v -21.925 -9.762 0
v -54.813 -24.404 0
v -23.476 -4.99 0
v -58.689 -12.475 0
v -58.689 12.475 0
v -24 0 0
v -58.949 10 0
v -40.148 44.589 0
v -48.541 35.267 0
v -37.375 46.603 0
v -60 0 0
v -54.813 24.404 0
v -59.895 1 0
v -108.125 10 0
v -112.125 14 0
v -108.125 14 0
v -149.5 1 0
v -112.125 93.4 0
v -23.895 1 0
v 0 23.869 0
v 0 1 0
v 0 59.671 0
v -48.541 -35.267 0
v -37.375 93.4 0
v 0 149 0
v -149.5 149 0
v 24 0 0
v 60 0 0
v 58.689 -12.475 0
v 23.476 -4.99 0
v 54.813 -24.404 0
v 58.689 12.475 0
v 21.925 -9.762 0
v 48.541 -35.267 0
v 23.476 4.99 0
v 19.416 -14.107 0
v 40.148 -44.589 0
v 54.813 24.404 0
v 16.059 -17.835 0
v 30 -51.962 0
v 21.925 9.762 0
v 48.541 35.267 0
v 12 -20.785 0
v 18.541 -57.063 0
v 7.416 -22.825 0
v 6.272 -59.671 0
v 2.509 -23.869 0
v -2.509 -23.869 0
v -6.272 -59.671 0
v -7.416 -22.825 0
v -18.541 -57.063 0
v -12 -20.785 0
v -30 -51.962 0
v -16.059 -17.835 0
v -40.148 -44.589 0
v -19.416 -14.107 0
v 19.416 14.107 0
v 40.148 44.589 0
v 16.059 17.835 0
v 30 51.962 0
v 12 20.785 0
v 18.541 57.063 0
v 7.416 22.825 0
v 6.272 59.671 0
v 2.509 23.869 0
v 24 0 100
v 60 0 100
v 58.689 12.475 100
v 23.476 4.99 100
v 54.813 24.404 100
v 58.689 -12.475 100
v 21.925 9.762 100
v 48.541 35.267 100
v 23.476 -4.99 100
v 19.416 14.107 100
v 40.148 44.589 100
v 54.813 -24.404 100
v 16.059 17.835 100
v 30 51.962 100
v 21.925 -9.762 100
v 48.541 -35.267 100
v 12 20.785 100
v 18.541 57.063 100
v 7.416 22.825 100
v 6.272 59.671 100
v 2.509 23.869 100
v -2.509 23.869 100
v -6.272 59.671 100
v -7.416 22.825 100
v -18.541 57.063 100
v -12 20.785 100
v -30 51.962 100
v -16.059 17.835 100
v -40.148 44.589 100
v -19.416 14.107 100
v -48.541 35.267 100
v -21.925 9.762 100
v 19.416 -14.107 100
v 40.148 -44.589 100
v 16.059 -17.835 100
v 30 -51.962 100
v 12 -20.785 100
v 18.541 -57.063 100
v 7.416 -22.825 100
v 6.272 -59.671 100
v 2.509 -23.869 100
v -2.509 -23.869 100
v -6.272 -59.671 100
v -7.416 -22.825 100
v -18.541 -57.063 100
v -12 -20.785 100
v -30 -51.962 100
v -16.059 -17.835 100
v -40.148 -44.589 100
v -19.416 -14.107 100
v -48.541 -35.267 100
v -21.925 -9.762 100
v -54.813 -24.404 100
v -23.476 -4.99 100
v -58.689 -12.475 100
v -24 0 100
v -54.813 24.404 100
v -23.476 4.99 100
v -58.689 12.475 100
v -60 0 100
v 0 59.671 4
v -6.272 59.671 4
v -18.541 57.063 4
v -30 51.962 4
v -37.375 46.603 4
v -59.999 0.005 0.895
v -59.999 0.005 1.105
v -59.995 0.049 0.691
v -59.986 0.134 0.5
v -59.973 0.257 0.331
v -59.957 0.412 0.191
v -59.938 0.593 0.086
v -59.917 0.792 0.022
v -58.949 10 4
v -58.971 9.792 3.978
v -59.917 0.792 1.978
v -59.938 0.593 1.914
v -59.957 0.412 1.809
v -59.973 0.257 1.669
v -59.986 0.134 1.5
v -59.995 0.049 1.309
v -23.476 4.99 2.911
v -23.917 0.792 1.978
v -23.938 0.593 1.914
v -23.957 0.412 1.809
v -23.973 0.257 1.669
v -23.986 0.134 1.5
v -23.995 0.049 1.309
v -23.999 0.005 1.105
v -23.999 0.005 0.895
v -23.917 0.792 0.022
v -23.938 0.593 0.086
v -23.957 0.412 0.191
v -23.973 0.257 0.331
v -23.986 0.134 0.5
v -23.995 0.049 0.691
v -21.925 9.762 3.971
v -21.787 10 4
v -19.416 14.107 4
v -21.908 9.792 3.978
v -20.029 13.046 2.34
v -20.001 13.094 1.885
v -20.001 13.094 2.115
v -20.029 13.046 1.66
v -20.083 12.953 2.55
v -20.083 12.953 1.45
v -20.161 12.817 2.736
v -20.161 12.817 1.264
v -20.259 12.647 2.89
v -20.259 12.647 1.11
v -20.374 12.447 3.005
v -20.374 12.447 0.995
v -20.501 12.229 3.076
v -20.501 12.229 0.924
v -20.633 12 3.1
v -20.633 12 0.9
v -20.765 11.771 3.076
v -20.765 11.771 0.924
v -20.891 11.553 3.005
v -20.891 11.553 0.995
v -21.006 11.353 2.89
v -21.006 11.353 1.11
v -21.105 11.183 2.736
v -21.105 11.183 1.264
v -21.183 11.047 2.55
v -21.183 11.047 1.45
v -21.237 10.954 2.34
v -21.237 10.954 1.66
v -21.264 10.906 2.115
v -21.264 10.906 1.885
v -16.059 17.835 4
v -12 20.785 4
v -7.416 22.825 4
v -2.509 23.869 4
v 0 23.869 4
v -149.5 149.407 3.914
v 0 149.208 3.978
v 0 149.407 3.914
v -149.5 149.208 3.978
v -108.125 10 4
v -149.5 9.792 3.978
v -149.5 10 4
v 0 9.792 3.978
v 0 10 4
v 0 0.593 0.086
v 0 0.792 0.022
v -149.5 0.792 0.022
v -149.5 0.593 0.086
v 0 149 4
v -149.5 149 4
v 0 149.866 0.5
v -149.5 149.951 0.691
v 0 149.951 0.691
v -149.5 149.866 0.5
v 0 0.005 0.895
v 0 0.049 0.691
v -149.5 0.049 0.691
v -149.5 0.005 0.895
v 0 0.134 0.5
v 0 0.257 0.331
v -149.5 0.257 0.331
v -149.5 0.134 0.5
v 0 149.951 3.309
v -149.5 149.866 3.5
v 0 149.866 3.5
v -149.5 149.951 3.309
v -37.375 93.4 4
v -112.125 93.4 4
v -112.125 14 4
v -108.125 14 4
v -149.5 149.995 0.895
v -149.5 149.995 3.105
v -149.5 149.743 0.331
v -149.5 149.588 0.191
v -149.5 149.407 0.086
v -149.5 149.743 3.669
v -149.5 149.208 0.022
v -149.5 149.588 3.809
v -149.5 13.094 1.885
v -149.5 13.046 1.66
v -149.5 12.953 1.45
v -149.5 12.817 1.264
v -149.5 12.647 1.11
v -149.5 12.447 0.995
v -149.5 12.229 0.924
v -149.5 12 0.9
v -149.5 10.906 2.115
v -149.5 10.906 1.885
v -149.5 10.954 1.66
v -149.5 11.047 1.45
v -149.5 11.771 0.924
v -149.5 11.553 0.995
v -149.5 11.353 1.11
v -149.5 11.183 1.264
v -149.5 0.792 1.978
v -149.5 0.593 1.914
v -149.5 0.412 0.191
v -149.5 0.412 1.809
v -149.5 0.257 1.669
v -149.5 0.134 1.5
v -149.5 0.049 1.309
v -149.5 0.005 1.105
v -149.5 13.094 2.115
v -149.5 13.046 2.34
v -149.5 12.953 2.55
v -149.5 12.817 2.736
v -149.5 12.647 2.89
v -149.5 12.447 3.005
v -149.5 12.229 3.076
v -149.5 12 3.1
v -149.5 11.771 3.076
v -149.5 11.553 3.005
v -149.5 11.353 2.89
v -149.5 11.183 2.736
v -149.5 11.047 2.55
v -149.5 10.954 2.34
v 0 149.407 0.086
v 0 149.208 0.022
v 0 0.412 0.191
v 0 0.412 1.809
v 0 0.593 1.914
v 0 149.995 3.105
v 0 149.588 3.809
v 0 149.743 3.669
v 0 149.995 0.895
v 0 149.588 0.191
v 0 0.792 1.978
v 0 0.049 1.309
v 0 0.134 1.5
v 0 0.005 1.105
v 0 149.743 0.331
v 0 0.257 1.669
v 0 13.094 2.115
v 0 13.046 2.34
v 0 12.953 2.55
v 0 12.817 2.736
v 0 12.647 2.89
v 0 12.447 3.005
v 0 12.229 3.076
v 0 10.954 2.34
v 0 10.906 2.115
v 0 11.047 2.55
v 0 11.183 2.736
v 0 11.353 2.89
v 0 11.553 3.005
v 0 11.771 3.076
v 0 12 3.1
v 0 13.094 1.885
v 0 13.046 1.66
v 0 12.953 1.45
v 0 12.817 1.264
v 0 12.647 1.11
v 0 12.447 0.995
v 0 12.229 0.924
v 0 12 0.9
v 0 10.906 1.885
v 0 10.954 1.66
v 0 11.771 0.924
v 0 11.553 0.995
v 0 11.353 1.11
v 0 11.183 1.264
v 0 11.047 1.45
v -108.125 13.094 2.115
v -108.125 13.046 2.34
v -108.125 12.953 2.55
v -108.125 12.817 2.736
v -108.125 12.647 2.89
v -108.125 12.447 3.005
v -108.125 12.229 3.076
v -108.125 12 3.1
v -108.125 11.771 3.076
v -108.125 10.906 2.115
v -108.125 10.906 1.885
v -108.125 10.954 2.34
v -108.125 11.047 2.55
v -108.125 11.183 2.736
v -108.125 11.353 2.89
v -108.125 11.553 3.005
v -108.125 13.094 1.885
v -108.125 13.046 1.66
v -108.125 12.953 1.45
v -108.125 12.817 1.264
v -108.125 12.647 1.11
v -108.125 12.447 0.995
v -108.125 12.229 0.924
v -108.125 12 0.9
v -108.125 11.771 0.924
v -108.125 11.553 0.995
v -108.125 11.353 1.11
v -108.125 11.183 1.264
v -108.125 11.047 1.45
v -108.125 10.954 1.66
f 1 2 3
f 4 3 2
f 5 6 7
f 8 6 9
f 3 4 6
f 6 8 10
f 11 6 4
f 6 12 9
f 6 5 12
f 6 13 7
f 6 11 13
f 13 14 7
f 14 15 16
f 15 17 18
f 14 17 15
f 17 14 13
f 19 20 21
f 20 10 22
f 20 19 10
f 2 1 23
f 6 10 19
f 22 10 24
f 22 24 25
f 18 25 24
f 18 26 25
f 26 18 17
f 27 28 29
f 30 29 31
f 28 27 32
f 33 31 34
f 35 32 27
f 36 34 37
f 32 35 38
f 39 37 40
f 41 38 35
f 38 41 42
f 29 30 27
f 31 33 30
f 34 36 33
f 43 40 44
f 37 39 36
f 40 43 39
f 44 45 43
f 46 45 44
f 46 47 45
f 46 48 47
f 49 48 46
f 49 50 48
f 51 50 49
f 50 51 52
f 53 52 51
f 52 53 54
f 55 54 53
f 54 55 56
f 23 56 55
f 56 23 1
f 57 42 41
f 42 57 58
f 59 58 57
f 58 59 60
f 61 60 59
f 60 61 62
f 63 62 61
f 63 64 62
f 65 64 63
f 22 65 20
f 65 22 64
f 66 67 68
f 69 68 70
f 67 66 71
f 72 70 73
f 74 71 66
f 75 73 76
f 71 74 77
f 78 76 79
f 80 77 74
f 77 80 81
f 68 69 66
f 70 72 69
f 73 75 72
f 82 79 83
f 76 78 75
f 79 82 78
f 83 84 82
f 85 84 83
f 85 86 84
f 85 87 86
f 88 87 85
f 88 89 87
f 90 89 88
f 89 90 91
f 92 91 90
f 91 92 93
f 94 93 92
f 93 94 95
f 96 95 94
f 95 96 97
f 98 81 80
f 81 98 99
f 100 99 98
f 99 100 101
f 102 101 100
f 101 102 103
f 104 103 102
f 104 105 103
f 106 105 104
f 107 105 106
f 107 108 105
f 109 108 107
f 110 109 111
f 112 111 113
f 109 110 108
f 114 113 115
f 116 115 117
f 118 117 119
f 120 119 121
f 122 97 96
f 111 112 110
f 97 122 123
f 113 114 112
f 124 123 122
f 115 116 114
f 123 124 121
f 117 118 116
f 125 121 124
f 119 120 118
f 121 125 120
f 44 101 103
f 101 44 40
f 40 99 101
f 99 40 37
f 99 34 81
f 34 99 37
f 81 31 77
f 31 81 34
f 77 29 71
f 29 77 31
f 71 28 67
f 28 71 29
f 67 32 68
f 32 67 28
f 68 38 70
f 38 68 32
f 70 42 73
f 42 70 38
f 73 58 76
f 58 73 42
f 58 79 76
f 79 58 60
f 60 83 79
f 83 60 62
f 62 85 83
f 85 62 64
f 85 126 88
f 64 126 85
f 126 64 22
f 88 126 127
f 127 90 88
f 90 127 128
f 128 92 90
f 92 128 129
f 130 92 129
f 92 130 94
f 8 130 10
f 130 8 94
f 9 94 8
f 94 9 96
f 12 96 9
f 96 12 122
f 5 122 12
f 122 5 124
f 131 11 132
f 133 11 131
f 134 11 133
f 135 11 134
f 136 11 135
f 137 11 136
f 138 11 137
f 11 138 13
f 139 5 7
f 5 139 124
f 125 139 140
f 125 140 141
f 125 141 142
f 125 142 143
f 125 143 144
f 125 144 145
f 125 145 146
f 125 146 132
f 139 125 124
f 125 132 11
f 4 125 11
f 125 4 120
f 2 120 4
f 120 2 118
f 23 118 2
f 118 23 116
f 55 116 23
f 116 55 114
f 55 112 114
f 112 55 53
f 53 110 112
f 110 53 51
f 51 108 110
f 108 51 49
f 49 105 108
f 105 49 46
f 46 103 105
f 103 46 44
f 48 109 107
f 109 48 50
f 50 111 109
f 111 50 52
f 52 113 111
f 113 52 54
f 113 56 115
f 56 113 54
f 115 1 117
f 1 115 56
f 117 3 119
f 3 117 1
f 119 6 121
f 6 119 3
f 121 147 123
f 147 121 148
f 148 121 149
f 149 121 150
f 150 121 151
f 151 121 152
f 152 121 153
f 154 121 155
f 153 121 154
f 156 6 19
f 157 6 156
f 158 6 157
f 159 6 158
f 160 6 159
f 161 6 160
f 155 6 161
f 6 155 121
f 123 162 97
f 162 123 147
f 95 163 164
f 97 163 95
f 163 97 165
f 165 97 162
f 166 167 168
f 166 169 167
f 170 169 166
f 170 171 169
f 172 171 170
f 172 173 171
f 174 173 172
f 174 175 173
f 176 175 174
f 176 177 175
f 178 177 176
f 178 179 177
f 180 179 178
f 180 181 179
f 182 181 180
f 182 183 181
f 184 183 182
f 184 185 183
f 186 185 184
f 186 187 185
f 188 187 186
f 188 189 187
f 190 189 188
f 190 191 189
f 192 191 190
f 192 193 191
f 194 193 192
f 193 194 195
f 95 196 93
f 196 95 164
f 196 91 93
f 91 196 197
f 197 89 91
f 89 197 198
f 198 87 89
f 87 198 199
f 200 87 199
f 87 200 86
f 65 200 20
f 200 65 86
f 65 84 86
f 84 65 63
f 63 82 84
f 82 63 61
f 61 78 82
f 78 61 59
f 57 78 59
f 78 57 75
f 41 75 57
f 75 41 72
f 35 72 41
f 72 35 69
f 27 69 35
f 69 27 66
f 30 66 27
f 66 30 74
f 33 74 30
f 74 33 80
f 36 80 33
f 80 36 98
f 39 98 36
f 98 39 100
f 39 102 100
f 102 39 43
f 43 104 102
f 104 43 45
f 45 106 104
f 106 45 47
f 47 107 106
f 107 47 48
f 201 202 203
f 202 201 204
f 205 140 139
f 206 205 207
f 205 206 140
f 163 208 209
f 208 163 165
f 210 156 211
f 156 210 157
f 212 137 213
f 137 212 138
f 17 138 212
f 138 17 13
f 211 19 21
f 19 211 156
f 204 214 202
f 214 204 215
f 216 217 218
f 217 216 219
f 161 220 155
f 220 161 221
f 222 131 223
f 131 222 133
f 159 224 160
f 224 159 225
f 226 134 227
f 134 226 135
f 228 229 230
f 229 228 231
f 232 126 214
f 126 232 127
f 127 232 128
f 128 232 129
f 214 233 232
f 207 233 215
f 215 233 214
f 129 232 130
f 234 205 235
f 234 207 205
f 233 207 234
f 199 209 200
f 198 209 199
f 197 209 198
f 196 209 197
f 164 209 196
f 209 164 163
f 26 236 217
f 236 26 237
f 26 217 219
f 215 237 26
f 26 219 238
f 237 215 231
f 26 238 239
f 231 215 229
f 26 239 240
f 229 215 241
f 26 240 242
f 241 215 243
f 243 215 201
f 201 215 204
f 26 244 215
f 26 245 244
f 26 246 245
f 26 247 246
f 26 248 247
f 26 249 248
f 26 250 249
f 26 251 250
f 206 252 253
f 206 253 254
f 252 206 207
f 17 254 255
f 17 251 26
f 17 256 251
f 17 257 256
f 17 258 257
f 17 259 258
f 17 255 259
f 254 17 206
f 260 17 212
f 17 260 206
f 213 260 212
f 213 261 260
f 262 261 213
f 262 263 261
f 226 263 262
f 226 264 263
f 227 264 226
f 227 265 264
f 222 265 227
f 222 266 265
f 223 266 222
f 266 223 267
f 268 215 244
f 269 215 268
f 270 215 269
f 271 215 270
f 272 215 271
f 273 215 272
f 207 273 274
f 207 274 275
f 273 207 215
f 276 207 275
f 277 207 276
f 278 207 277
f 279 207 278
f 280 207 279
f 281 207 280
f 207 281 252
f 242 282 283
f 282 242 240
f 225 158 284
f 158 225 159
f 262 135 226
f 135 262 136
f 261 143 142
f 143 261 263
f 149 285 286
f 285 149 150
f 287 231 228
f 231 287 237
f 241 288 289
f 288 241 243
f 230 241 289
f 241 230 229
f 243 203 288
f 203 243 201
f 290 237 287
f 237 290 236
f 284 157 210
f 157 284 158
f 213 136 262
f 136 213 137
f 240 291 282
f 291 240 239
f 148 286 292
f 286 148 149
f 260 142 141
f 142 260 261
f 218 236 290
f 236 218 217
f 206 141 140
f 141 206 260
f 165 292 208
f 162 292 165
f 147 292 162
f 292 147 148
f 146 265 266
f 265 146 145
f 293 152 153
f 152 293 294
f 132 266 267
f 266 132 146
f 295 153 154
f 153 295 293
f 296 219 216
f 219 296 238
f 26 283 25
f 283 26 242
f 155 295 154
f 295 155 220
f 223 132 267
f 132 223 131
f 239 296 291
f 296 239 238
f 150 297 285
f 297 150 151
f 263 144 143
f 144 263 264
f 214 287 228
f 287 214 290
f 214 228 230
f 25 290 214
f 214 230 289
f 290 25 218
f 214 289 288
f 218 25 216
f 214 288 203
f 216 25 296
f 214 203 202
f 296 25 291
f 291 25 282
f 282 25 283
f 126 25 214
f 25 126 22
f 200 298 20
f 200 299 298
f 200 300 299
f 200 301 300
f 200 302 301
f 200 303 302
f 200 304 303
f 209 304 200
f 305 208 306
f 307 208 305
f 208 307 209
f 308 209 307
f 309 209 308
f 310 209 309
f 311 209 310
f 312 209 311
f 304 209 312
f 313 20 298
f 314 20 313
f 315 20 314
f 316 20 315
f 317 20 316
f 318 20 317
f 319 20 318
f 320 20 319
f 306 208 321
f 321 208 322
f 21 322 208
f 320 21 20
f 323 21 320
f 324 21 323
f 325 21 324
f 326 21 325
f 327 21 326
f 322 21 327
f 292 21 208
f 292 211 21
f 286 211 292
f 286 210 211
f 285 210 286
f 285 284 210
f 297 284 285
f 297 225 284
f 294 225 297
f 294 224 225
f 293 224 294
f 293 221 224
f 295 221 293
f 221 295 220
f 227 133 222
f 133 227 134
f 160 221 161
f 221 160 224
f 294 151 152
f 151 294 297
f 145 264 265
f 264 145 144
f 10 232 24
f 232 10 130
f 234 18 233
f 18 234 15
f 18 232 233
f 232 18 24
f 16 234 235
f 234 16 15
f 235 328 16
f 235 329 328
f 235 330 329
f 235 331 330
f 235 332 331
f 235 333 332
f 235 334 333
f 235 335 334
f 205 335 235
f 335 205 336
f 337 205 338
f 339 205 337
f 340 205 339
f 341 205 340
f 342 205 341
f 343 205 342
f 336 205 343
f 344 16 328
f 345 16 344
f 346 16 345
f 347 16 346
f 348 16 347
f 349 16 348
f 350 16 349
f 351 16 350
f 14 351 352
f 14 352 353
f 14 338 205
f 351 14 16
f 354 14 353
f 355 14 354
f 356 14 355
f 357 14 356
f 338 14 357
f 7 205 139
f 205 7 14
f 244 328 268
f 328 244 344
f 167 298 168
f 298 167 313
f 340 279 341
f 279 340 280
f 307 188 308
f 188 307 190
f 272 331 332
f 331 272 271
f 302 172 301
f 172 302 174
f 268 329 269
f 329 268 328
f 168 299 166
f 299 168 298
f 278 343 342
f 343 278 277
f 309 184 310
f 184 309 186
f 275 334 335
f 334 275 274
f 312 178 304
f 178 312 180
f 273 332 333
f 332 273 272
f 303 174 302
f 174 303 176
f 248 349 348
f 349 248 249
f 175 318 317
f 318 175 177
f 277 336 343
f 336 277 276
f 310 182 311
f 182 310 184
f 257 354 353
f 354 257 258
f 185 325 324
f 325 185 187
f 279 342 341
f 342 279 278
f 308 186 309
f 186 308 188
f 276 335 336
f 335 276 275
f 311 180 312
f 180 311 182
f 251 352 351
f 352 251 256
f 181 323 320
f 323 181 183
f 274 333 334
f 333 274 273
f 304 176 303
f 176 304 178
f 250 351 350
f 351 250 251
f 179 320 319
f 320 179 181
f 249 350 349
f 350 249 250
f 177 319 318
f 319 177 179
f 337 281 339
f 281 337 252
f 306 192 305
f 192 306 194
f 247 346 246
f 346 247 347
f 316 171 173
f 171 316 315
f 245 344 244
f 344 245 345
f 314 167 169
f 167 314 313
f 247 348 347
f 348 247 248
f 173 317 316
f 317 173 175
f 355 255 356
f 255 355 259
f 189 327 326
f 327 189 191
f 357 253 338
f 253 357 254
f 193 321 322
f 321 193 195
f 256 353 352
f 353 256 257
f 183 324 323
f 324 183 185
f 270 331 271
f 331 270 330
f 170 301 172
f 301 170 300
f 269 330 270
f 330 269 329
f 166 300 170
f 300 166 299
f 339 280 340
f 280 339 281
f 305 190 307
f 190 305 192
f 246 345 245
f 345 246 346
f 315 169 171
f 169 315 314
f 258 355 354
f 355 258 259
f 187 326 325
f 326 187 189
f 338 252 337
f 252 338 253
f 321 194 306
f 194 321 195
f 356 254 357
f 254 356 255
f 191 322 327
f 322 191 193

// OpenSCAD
$fn=30;

/* [Dimensions] */
//Dimensions of the compartment
compDims=[150,150,150];
//spacing between mechanism and compartment
cmpSpcng=0.5;
//Diameter of the axis
axisDia=2;
//spacing for the axis
axisSpcng=0.1;

/* [show] */
showRoll=true;
showBase=true;

/* [Hidden] */
fudge=0.1;

if (showRoll) paperRoll();
if (showBase) base();

module base(){
  crnrRad=1;
  rampWdth=10;
  baseDims=[compDims.x-cmpSpcng,compDims.y-cmpSpcng*2,4];
  flapDims=[baseDims.x*0.5,(baseDims.y-rampWdth)*0.6,baseDims.z];
  
  //base
  difference(){
    baseBdy();
    translate([-baseDims.x/2,rampWdth+(flapDims.y+baseDims.z)/2,baseDims.z/2]) 
      cube(flapDims+[0,-baseDims.z,fudge],true);
    translate([-baseDims.x/2,rampWdth+(baseDims.z+fudge)/2,baseDims.z/2]) 
      cube([flapDims.x-baseDims.z*2,baseDims.z+fudge,baseDims.z+fudge],true);
    //axis
    translate([fudge/2,rampWdth+baseDims.z/2,baseDims.z/2]) 
      rotate([0,-90,0]) cylinder(d=axisDia+axisSpcng*2,h=baseDims.x+fudge);
  }
  
  //flap
  translate([]) rotate([0,-90,0]) linear_extrude() difference(){
    
  }
  
  module baseBdy(){
    rotate([0,-90,0]) linear_extrude(baseDims.x) hull(){
      translate([crnrRad,crnrRad]) circle(crnrRad);
      translate([crnrRad,baseDims.y]) circle(crnrRad);
      translate([baseDims.z-crnrRad,rampWdth]) circle(crnrRad);
      translate([baseDims.z-crnrRad,baseDims.y]) circle(crnrRad);
      }
  }
}

module paperRoll(){
  dOuter=120;
  dInner=50;
  hght=120;
  color("white") linear_extrude() difference(){
    circle(d=dOuter);
    circle(d=dInner);
  }
  color("grey") linear_extrude() difference(){
    circle(d=dInner);
    circle(d=dInner-2);
  }
}
